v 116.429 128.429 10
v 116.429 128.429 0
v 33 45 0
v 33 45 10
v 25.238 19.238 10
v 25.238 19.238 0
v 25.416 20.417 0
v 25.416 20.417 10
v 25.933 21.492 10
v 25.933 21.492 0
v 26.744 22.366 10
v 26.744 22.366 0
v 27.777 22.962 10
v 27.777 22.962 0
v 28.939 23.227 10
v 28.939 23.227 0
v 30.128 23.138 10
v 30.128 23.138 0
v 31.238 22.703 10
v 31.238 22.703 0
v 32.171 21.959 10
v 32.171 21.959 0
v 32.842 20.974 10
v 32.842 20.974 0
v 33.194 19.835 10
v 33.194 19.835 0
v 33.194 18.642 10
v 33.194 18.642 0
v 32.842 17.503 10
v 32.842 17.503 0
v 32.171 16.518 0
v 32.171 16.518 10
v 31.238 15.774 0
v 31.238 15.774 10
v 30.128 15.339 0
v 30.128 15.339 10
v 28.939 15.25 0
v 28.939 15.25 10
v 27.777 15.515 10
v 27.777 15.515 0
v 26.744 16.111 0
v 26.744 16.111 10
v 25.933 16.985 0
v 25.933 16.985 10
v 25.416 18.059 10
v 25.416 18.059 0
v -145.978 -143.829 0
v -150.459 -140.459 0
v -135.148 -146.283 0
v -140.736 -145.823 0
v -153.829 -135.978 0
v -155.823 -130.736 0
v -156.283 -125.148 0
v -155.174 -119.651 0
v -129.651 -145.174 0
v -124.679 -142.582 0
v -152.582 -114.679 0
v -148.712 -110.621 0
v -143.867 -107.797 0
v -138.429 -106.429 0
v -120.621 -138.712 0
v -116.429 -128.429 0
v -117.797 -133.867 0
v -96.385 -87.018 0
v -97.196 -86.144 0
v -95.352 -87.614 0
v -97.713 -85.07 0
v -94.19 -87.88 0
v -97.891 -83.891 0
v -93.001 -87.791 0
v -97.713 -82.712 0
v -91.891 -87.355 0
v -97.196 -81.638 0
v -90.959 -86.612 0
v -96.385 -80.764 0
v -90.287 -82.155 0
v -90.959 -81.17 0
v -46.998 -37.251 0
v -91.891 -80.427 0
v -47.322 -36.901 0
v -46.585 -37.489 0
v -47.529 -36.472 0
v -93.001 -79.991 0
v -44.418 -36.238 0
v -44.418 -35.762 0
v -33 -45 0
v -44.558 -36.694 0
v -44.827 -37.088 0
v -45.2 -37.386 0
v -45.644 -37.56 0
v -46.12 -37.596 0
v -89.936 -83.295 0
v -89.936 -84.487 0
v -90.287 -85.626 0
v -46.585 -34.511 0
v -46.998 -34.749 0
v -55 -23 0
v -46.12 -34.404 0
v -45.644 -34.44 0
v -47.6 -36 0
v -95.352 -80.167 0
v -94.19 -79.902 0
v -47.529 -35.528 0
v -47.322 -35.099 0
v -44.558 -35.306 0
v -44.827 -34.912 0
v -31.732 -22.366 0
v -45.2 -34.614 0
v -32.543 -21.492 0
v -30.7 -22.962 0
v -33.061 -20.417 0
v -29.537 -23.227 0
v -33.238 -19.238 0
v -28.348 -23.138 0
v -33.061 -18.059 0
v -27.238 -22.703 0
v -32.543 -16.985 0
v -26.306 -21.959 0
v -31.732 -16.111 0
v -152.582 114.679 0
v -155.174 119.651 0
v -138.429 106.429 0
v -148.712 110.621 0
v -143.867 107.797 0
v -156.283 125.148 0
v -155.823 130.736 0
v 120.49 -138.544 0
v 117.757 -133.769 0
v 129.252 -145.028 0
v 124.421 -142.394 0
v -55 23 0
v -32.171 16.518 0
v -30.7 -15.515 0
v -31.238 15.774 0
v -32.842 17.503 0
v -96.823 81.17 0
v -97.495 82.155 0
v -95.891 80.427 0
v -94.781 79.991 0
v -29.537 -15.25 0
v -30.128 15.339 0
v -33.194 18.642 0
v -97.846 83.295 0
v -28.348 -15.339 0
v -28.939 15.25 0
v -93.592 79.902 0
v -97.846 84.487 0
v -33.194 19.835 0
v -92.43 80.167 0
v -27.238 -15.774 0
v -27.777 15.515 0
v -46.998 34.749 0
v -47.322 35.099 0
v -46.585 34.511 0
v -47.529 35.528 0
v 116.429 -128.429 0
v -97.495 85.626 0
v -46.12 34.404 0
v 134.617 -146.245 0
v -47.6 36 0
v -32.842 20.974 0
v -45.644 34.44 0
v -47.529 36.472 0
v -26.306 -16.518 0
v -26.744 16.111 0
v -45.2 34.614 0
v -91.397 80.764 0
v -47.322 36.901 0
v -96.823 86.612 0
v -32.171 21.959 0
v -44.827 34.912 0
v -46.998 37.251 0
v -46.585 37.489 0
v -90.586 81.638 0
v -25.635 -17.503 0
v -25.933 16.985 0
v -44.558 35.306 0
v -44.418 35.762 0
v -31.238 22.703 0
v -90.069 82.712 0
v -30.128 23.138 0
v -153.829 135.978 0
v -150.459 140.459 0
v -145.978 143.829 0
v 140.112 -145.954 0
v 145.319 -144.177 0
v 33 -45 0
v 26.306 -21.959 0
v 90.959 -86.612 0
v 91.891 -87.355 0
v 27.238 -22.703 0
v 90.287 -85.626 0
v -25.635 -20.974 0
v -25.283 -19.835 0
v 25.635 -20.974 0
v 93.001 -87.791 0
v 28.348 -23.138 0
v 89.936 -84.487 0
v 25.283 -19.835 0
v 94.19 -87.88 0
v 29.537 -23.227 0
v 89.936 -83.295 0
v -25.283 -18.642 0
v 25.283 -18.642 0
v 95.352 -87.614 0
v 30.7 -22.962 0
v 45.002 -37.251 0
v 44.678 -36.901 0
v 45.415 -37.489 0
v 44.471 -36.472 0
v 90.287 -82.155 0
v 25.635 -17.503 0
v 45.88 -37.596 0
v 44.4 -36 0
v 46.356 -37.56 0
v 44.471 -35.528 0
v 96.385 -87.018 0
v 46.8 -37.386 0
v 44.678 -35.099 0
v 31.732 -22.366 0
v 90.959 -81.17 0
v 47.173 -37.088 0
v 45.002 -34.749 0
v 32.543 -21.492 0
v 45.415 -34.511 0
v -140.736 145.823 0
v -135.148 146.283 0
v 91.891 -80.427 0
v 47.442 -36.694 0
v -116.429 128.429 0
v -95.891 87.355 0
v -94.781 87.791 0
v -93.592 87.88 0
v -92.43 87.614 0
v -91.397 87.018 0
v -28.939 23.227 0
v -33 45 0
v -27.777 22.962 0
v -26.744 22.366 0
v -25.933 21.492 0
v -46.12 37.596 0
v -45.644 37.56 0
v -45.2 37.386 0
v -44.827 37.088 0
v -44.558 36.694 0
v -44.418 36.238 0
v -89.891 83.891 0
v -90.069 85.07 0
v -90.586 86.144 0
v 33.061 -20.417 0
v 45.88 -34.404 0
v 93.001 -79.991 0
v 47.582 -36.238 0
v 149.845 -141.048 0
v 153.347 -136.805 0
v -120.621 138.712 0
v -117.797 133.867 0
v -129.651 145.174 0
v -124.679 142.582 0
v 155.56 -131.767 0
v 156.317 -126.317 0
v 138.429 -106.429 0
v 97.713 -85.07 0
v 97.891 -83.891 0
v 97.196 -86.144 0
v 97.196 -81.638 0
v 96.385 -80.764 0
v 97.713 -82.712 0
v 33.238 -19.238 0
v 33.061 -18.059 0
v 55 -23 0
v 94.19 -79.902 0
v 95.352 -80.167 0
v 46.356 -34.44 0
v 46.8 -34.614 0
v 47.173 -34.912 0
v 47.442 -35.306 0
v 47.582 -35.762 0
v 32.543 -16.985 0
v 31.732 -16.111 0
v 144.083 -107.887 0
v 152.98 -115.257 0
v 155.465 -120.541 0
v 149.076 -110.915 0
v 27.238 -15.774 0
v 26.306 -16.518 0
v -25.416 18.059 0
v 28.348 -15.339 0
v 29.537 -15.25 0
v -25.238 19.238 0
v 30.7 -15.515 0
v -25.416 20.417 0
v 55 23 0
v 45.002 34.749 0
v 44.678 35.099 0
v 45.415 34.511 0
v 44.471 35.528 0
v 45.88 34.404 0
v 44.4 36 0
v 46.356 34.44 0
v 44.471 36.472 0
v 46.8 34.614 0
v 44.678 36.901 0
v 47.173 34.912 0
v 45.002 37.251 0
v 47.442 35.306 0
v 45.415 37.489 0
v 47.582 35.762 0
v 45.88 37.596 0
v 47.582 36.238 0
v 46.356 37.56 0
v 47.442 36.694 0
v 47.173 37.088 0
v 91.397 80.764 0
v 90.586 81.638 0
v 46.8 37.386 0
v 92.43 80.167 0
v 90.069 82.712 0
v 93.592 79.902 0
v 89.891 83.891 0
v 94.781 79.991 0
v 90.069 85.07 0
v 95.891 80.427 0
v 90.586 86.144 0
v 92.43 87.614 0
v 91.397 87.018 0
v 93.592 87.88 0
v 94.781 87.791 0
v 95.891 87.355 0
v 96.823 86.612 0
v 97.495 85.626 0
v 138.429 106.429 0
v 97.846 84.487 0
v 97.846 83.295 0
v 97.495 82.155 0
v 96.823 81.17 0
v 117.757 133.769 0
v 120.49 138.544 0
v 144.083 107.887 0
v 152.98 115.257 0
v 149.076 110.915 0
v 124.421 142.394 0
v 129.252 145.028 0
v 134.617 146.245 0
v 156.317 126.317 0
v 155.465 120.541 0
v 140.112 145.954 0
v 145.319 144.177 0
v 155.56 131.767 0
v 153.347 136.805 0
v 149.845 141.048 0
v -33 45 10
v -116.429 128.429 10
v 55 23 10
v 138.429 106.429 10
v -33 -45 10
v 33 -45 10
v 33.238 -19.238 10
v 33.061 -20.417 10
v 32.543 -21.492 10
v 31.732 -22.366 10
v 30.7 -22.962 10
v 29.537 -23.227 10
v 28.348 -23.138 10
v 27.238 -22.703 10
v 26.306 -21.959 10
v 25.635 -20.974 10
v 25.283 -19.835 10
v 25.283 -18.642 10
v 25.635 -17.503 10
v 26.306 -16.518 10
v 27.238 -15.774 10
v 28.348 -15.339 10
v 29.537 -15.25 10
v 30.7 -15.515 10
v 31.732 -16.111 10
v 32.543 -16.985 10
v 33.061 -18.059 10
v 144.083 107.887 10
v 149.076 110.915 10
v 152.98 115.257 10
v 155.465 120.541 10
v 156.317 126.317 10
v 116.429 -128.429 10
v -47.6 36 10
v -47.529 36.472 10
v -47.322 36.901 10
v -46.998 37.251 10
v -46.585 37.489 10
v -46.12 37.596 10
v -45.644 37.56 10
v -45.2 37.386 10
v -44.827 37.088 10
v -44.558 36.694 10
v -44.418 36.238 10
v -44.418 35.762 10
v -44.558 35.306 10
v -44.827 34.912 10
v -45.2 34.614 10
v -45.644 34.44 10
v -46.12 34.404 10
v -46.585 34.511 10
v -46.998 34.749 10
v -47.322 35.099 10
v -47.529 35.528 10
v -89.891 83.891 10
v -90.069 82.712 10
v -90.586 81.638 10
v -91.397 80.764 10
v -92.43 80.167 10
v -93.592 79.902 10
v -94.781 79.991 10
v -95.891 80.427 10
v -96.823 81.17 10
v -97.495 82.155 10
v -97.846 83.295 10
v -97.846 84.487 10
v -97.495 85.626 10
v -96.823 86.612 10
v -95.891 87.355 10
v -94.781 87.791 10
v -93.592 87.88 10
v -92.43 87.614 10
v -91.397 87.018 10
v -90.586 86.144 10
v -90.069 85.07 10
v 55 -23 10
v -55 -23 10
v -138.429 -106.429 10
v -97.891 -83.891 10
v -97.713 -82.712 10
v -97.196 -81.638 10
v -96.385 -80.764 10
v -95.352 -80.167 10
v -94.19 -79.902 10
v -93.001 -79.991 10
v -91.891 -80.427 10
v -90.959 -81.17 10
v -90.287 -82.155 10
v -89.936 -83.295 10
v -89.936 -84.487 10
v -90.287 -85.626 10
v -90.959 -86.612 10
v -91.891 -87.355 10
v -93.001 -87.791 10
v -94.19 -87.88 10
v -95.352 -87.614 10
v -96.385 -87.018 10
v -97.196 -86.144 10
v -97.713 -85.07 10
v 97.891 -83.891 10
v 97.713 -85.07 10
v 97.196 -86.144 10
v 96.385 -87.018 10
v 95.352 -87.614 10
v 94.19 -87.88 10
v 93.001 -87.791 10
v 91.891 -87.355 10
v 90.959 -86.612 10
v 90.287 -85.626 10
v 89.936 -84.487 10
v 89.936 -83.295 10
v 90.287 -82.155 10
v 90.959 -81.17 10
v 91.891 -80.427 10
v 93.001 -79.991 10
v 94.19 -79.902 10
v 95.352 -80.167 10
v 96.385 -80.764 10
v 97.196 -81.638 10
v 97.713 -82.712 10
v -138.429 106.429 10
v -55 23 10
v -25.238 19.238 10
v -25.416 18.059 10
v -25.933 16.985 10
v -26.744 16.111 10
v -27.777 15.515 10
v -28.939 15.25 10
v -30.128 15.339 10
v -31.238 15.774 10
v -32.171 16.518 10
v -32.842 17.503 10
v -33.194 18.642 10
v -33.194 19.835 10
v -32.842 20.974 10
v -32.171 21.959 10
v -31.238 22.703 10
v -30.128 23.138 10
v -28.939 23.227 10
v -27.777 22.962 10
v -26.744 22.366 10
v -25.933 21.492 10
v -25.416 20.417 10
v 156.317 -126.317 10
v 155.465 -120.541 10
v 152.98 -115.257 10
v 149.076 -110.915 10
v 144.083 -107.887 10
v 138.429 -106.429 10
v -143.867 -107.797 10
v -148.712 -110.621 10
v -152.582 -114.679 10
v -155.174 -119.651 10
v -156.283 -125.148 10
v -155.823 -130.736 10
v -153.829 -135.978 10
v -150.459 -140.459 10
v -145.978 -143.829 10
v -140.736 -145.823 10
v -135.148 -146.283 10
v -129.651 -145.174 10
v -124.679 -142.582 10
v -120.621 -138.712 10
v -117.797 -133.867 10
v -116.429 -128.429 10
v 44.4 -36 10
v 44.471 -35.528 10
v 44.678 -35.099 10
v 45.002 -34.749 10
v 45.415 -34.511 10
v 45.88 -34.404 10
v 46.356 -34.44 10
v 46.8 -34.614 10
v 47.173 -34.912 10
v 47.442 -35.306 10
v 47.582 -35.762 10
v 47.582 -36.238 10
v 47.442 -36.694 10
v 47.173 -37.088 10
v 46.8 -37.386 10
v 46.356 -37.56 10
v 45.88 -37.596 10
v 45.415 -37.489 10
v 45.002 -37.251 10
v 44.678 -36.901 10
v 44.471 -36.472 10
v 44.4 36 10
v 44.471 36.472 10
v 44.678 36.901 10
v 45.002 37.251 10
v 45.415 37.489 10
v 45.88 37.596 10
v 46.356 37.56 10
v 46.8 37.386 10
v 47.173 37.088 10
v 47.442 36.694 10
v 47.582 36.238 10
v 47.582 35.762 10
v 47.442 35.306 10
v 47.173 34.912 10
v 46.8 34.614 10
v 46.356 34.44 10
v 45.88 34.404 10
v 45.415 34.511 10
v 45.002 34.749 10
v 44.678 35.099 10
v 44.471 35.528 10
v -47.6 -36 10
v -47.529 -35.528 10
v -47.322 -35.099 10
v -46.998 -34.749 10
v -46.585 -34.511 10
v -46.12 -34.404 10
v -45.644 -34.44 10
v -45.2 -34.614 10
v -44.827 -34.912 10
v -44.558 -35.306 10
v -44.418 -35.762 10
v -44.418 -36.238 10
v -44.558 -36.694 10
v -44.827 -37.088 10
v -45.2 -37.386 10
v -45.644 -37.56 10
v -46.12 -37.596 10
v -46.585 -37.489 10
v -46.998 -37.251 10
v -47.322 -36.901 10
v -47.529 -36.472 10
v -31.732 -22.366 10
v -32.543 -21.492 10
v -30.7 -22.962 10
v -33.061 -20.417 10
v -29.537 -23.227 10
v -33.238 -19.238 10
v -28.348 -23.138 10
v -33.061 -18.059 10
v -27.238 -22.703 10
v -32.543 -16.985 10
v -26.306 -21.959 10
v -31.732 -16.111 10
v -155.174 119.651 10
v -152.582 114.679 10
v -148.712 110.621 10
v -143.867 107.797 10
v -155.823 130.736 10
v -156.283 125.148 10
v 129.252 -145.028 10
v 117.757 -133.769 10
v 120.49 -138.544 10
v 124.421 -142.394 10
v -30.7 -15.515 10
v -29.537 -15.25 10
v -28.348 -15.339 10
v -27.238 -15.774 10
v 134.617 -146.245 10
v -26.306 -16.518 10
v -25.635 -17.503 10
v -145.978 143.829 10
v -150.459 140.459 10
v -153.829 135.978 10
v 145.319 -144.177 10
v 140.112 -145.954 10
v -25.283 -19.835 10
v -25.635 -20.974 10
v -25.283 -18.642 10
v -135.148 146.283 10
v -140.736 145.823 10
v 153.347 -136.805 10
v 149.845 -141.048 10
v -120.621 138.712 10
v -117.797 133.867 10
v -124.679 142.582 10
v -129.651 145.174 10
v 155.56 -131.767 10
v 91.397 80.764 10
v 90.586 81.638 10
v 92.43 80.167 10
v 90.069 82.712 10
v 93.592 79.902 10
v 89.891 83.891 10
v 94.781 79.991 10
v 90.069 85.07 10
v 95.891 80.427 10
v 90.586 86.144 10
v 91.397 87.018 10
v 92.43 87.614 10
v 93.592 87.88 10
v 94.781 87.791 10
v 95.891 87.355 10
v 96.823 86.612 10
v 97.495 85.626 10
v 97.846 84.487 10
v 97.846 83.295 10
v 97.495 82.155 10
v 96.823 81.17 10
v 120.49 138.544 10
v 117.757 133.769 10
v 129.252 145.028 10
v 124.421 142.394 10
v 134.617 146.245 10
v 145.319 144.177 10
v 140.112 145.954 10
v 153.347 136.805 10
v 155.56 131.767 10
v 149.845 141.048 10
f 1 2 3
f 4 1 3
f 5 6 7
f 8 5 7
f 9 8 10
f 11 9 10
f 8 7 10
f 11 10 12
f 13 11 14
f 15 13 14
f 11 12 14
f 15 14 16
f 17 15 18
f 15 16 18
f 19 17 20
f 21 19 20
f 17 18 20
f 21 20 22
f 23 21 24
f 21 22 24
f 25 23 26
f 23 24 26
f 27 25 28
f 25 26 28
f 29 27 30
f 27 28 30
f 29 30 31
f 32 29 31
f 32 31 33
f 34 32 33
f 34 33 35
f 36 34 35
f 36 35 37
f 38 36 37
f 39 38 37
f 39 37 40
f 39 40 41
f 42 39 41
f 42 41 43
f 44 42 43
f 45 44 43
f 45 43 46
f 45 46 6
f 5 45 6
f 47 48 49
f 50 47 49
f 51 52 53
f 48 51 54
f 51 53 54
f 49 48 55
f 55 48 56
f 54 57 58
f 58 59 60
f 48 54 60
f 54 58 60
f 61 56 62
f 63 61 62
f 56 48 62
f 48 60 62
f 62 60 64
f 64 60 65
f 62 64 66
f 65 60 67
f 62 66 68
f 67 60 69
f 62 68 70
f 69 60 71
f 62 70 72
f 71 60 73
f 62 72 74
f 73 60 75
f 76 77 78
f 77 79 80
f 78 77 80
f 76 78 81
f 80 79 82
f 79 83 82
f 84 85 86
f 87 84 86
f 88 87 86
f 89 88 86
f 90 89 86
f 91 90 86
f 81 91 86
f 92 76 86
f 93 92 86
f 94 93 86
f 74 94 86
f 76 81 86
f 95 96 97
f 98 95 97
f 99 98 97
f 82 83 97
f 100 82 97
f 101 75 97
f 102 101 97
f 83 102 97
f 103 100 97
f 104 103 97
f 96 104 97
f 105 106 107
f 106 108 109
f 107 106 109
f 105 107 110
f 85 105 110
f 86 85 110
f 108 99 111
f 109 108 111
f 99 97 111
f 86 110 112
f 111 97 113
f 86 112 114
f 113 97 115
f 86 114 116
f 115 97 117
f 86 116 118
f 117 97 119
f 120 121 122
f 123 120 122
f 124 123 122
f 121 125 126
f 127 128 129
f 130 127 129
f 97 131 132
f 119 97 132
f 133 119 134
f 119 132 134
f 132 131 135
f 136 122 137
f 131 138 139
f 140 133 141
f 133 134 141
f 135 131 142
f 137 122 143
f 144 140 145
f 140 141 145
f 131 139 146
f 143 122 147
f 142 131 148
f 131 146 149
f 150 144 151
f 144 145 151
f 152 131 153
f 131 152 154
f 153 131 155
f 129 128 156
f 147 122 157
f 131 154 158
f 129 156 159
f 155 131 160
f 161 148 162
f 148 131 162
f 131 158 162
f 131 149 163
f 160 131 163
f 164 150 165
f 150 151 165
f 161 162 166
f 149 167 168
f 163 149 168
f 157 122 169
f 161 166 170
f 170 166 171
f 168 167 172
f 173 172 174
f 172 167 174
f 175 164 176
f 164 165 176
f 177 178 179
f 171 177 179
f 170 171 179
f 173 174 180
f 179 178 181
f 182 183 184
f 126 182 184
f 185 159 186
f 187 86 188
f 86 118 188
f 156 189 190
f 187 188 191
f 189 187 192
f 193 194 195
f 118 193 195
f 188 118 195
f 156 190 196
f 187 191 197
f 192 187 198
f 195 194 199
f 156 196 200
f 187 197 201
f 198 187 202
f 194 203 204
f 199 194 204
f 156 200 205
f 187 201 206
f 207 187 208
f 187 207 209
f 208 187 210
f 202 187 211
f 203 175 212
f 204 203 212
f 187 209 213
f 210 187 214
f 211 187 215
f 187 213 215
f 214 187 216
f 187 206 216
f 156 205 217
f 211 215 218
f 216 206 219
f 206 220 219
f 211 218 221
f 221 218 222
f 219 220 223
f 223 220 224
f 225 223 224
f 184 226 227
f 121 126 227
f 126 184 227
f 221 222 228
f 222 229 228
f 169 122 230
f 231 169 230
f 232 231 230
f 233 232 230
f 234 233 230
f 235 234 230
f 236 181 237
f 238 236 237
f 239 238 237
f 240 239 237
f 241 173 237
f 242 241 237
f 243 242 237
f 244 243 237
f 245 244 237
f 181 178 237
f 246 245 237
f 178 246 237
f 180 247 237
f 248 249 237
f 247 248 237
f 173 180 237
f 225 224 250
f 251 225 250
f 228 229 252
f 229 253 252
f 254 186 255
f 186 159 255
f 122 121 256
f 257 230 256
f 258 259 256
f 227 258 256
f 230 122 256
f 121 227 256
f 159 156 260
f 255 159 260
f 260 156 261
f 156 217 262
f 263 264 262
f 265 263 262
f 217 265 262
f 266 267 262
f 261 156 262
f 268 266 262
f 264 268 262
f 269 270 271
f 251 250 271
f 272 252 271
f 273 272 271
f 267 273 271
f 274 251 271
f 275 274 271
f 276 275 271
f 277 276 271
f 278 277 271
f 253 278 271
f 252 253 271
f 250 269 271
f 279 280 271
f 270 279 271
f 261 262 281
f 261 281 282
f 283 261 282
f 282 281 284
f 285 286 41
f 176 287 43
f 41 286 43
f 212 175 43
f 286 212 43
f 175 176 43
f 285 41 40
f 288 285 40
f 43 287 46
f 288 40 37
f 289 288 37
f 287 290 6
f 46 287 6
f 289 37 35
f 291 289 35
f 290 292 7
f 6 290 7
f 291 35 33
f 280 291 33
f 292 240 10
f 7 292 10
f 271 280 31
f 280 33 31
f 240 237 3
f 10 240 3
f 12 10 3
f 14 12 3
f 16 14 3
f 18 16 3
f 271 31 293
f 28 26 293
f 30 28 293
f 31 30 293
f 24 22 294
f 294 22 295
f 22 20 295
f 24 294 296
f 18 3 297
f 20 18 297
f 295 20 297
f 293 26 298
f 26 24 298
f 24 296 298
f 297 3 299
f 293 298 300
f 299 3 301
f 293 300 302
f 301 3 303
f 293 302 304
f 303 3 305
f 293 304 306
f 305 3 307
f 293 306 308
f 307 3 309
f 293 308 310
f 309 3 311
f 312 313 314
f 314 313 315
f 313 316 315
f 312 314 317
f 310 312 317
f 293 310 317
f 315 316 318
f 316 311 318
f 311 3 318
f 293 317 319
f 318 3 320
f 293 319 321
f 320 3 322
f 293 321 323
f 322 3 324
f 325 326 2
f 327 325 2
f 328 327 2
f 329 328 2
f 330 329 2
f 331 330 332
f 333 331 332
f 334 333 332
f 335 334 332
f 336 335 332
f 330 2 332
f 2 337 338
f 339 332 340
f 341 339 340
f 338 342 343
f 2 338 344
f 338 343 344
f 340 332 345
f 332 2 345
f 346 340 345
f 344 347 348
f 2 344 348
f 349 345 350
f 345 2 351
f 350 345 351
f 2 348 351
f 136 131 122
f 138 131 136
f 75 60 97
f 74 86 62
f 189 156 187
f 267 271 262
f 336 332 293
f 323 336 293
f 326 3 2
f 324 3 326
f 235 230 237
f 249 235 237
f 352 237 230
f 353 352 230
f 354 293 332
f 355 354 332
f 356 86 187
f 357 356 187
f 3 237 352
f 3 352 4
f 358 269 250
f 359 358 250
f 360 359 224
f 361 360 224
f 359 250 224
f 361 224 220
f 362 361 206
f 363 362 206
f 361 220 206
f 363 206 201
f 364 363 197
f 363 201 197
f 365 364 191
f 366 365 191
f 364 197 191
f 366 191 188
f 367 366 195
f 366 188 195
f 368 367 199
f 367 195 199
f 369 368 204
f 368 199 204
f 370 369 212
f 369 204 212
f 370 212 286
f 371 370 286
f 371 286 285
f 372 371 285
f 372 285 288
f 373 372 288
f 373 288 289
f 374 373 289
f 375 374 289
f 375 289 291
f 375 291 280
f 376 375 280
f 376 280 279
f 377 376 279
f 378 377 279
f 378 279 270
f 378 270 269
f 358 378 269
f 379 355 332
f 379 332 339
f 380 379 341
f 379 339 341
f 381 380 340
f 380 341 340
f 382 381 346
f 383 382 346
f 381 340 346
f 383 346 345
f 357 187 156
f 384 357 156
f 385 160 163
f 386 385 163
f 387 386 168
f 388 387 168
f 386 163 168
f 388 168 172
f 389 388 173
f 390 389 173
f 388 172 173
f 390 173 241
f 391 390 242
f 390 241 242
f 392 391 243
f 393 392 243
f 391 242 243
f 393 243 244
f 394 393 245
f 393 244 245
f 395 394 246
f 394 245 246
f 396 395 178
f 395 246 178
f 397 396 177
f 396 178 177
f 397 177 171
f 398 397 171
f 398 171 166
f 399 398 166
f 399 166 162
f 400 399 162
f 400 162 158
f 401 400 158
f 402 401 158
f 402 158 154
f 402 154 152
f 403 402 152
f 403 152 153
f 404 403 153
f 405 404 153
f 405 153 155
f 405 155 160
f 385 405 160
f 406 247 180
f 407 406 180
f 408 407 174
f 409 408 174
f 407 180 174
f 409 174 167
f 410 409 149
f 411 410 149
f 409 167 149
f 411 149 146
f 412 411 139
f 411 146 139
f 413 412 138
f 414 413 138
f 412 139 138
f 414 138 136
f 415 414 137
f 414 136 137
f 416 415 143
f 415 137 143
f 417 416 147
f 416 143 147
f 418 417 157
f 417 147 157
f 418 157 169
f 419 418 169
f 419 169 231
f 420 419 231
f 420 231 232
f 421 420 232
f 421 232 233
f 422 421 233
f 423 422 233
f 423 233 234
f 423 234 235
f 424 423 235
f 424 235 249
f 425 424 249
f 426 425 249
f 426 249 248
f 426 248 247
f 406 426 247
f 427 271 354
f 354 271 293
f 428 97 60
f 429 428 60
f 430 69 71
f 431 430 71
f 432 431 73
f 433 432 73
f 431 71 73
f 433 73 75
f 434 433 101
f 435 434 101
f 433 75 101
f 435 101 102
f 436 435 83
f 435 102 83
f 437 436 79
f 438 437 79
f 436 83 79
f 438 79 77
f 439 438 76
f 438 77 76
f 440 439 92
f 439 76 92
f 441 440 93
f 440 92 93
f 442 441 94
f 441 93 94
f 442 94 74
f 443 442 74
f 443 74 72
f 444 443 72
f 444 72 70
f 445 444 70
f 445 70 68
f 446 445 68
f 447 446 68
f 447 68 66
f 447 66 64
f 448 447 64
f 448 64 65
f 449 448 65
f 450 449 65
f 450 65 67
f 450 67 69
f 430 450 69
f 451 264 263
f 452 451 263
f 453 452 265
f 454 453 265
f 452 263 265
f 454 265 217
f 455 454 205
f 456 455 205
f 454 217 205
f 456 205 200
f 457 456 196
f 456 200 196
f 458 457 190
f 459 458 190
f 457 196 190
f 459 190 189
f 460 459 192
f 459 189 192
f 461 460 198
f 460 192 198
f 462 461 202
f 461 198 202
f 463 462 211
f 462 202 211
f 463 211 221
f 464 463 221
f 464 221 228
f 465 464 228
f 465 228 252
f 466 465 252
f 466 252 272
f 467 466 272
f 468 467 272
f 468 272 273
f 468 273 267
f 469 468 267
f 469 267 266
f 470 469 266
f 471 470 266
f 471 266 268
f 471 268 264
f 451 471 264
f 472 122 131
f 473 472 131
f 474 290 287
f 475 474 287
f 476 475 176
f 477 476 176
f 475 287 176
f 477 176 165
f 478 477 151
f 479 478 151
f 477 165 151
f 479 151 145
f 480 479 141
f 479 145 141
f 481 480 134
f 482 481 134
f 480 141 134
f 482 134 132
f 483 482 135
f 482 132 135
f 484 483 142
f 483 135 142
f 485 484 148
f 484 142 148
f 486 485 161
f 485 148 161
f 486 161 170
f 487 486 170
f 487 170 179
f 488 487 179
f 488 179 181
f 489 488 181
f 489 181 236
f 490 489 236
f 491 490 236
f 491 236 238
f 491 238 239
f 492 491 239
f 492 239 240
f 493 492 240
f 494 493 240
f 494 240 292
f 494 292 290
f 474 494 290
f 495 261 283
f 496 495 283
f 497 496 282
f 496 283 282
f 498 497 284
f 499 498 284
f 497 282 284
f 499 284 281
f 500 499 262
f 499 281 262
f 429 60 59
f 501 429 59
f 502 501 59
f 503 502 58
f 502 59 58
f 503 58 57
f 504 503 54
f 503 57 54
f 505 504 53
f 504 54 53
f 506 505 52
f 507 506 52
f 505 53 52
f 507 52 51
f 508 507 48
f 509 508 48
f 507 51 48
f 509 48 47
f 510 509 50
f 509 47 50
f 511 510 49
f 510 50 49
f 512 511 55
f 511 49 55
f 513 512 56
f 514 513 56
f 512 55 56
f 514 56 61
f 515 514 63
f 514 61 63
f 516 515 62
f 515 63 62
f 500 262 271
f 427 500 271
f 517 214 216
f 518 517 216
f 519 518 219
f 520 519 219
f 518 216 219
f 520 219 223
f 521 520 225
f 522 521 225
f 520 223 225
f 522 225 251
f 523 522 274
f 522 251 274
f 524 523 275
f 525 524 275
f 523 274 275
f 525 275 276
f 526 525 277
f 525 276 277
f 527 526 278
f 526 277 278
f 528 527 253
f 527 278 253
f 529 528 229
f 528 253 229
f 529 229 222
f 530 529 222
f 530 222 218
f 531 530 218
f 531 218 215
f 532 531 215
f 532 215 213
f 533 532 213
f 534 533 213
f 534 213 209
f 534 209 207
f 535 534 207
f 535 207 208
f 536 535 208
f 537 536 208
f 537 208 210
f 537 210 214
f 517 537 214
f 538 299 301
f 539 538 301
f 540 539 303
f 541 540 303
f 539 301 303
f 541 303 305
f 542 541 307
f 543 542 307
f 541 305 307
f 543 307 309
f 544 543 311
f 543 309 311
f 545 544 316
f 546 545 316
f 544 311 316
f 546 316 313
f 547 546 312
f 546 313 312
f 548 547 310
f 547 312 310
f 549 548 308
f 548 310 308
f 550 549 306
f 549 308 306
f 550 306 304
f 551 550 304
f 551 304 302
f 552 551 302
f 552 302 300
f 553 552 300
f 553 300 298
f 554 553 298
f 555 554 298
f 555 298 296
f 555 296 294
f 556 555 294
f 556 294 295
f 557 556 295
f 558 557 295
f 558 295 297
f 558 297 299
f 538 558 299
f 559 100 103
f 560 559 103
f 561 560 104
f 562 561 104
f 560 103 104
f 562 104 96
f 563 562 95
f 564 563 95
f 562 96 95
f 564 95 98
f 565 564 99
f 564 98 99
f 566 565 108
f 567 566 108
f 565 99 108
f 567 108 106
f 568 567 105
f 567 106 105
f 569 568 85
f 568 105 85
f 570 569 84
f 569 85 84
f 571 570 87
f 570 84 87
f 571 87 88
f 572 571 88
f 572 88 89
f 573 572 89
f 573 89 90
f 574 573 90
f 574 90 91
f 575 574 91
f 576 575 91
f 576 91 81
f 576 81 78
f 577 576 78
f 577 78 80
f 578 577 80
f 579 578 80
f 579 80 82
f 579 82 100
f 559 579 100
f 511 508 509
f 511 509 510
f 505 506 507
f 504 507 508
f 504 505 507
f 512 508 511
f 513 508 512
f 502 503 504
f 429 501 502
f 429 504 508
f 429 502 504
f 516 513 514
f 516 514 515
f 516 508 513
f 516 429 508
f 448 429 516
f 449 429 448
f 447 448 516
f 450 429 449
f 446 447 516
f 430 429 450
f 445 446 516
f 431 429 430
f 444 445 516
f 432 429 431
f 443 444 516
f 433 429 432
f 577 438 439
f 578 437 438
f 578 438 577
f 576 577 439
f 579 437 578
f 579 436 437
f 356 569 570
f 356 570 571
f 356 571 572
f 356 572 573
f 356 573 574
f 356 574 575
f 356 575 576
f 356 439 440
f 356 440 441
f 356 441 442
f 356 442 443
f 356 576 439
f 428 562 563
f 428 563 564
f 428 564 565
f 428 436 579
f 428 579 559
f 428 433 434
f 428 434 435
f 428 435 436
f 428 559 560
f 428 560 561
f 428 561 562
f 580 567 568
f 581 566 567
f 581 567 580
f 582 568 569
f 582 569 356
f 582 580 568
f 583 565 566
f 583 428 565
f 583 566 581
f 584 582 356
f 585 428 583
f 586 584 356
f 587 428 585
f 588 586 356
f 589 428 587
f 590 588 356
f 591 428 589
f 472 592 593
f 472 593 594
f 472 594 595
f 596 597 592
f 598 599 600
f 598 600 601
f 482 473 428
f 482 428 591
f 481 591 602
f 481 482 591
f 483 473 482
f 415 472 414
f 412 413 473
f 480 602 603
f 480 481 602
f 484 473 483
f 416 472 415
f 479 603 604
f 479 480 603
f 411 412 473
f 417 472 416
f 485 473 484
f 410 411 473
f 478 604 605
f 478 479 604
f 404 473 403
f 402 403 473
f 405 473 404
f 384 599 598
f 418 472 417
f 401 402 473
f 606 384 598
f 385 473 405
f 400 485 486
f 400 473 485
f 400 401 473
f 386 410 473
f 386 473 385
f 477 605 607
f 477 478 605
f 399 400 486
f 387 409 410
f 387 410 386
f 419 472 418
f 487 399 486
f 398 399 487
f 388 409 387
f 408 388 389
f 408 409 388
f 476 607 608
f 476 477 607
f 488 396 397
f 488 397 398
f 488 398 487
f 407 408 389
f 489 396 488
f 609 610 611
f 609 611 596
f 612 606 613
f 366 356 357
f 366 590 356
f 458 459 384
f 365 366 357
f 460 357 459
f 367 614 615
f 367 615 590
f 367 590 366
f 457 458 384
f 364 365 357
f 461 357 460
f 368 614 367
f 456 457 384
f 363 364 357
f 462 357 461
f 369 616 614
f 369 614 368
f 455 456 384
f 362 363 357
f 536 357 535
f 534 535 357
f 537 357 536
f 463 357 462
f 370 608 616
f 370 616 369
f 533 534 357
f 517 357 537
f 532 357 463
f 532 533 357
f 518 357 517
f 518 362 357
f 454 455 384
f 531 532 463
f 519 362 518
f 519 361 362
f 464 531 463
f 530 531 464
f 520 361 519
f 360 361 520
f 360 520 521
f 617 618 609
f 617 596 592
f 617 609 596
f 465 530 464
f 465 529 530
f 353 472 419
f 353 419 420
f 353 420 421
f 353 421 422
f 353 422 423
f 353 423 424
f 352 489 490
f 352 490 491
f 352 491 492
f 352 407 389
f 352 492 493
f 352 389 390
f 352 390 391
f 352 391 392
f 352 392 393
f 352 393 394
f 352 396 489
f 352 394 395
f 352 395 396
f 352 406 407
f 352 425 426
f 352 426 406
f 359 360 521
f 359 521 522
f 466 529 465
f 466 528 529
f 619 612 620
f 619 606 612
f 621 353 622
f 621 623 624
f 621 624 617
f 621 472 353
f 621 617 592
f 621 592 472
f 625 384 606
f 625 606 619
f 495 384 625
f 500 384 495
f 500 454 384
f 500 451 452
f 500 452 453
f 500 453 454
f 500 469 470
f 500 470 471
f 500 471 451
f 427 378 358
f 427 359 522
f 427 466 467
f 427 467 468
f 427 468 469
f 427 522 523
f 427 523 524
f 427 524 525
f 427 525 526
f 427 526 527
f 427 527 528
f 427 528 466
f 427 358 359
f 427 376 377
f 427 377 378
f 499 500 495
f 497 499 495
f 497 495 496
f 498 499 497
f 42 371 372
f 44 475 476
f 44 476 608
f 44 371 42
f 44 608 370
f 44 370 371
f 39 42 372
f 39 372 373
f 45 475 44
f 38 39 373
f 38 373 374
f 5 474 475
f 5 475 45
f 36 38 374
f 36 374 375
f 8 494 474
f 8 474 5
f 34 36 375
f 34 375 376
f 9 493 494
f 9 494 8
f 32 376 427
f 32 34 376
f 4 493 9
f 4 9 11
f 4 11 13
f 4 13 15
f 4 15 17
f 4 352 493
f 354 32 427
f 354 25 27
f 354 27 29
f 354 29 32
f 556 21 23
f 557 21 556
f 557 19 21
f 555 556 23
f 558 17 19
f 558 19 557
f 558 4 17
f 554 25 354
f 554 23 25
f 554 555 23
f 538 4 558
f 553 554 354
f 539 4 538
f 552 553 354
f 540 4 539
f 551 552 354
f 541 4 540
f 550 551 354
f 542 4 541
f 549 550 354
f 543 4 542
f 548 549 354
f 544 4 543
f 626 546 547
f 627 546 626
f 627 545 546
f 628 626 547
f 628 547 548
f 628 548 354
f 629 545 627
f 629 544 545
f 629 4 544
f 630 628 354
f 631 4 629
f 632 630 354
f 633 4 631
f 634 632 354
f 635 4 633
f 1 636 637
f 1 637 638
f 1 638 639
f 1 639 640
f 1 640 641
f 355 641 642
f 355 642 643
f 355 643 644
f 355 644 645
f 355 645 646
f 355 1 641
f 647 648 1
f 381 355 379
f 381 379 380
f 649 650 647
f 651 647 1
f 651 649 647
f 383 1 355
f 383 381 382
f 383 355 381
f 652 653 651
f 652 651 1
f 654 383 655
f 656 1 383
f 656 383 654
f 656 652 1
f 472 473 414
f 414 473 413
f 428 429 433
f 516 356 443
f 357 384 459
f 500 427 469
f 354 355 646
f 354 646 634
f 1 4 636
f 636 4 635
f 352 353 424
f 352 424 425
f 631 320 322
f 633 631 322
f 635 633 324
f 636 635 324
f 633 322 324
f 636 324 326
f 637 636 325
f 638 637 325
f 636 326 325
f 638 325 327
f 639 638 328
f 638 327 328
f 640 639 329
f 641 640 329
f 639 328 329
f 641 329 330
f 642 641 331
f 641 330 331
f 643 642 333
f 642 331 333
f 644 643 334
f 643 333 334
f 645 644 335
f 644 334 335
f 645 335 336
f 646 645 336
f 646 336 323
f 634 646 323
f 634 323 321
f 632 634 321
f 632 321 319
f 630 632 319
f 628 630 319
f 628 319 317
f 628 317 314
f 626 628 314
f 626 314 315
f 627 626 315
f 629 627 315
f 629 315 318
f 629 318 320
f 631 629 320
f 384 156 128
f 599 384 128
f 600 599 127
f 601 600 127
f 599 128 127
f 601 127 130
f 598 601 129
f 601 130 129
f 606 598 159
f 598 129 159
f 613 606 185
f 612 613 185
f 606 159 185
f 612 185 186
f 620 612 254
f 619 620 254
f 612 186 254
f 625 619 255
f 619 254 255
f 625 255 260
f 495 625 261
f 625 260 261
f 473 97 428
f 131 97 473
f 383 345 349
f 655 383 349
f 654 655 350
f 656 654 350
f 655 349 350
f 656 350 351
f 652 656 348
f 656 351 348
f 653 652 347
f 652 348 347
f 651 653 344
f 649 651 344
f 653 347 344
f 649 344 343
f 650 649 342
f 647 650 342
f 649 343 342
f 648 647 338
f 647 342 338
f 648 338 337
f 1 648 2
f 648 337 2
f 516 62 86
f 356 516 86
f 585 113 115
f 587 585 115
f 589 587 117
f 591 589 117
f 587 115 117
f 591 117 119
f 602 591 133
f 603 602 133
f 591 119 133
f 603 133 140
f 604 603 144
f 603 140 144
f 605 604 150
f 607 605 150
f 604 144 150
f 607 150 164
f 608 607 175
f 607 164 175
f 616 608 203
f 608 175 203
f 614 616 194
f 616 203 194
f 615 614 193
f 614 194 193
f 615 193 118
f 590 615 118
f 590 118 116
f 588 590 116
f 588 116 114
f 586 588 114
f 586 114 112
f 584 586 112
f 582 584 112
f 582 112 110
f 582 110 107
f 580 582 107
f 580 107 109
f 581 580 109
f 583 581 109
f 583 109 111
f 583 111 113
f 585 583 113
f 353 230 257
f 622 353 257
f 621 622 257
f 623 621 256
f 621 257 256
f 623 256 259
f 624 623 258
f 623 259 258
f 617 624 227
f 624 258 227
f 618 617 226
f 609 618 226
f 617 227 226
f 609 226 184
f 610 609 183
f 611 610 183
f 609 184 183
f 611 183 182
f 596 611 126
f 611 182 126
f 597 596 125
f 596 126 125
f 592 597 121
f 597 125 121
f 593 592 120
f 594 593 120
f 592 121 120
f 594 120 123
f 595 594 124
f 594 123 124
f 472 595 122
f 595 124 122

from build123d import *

# Parameters (mm, degrees)
ESQUISSE1_W             = 110
ESQUISSE1_H             = 90
BOSS_EXTRU_1_DEPTH      = 10
ESQUISSE3_R             = 4
ESQUISSE3_R_2           = 1.6
ENL_V_MAT_EXTRU_2_DEPTH = 215.345138396


with BuildPart() as part:
    # Esquisse1 → Boss.-Extru.1 (new body)
    with BuildSketch(Plane.XY):
        with BuildLine():
            ThreePointArc((-116.429085419, 128.429085419), (-150.45941546, 140.45941546), (-138.429085419, 106.429085419))
            Line((-138.429085419, 106.429085419), (-147.317279836, 115.317279836))
            Line((-147.317279836, 115.317279836), (-125.317279836, 137.317279836))
            Line((-125.317279836, 137.317279836), (-116.429085419, 128.429085419))
        make_face()
        with BuildLine():
            Line((-147.317279836, 115.317279836), (-138.429085419, 106.429085419))
            ThreePointArc((-138.429085419, 106.429085419), (-122.942604357, 111.447240972), (-116.317279836, 126.317279836))
            ThreePointArc((-116.317279836, 126.317279836), (-116.345250791, 127.374661426), (-116.429085419, 128.429085419))
            Line((-116.429085419, 128.429085419), (-125.317279836, 137.317279836))
            Line((-125.317279836, 137.317279836), (-147.317279836, 115.317279836))
        make_face()
        with BuildLine():
            Line((-138.429085419, 106.429085419), (-55, 23))
            Line((-55, 23), (-55, 45))
            Line((-55, 45), (-33, 45))
            Line((-33, 45), (-116.429085419, 128.429085419))
            ThreePointArc((-116.429085419, 128.429085419), (-116.345250791, 127.374661426), (-116.317279836, 126.317279836))
            ThreePointArc((-116.317279836, 126.317279836), (-122.942604357, 111.447240972), (-138.429085419, 106.429085419))
        make_face()
        with BuildLine():
            Line((116.429085419, 128.429085419), (33, 45))
            Line((33, 45), (55, 45))
            Line((55, 45), (55, 23))
            Line((55, 23), (138.429085419, 106.429085419))
            ThreePointArc((138.429085419, 106.429085419), (122.175144213, 112.175144213), (116.429085419, 128.429085419))
        make_face()
        with BuildLine():
            ThreePointArc((156.317279836, 126.317279836), (137.374661426, 146.289308881), (116.429085419, 128.429085419))
            Line((116.429085419, 128.429085419), (125.317279836, 137.317279836))
            Line((125.317279836, 137.317279836), (147.317279836, 115.317279836))
            Line((147.317279836, 115.317279836), (138.429085419, 106.429085419))
            ThreePointArc((138.429085419, 106.429085419), (151.187318701, 112.942604357), (156.317279836, 126.317279836))
        make_face()
        with BuildLine():
            Line((125.317279836, 137.317279836), (116.429085419, 128.429085419))
            ThreePointArc((116.429085419, 128.429085419), (122.175144213, 112.175144213), (138.429085419, 106.429085419))
            Line((138.429085419, 106.429085419), (147.317279836, 115.317279836))
            Line((147.317279836, 115.317279836), (125.317279836, 137.317279836))
        make_face()
        Rectangle(ESQUISSE1_W, ESQUISSE1_H)
        with BuildLine():
            ThreePointArc((138.429085419, -106.429085419), (122.175144213, -112.175144213), (116.429085419, -128.429085419))
            Line((116.429085419, -128.429085419), (125.317279836, -137.317279836))
            Line((125.317279836, -137.317279836), (147.317279836, -115.317279836))
            Line((147.317279836, -115.317279836), (138.429085419, -106.429085419))
        make_face()
        with BuildLine():
            Line((125.317279836, -137.317279836), (116.429085419, -128.429085419))
            ThreePointArc((116.429085419, -128.429085419), (137.374661426, -146.289308881), (156.317279836, -126.317279836))
            ThreePointArc((156.317279836, -126.317279836), (151.187318701, -112.942604357), (138.429085419, -106.429085419))
            Line((138.429085419, -106.429085419), (147.317279836, -115.317279836))
            Line((147.317279836, -115.317279836), (125.317279836, -137.317279836))
        make_face()
        with BuildLine():
            Line((55, -45), (33, -45))
            Line((33, -45), (116.429085419, -128.429085419))
            ThreePointArc((116.429085419, -128.429085419), (122.175144213, -112.175144213), (138.429085419, -106.429085419))
            Line((138.429085419, -106.429085419), (55, -23))
            Line((55, -23), (55, -45))
        make_face()
        with BuildLine():
            ThreePointArc((-116.317279836, -126.317279836), (-122.942604357, -111.447240972), (-138.429085419, -106.429085419))
            Line((-138.429085419, -106.429085419), (-147.317279836, -115.317279836))
            Line((-147.317279836, -115.317279836), (-125.317279836, -137.317279836))
            Line((-125.317279836, -137.317279836), (-116.429085419, -128.429085419))
            ThreePointArc((-116.429085419, -128.429085419), (-116.345250791, -127.374661426), (-116.317279836, -126.317279836))
        make_face()
        with BuildLine():
            Line((-147.317279836, -115.317279836), (-138.429085419, -106.429085419))
            ThreePointArc((-138.429085419, -106.429085419), (-150.45941546, -140.45941546), (-116.429085419, -128.429085419))
            Line((-116.429085419, -128.429085419), (-125.317279836, -137.317279836))
            Line((-125.317279836, -137.317279836), (-147.317279836, -115.317279836))
        make_face()
        with BuildLine():
            Line((-55, -45), (-55, -23))
            Line((-55, -23), (-138.429085419, -106.429085419))
            ThreePointArc((-138.429085419, -106.429085419), (-122.942604357, -111.447240972), (-116.317279836, -126.317279836))
            ThreePointArc((-116.317279836, -126.317279836), (-116.345250791, -127.374661426), (-116.429085419, -128.429085419))
            Line((-116.429085419, -128.429085419), (-33, -45))
            Line((-33, -45), (-55, -45))
        make_face()
    extrude(amount=BOSS_EXTRU_1_DEPTH)

    # Esquisse3 → Enlèv. mat.-Extru.2 (cut, through all)
    with BuildSketch(Plane(origin=(0, 0, 0), x_dir=(-1, 0, 0), z_dir=(0, 0, -1))):
        with Locations(Location((93.890872965, 83.890872965, 0), (0, 0, 180))):
            Circle(ESQUISSE3_R)
        with Locations((-93.890872965, 83.890872965)):
            Circle(ESQUISSE3_R)
        with Locations((-29.238399287, 19.238399287)):
            Circle(ESQUISSE3_R)
        with Locations((-46, 36)):
            Circle(ESQUISSE3_R_2)
        with Locations((46, 36)):
            Circle(ESQUISSE3_R_2)
        with Locations((46, -36)):
            Circle(ESQUISSE3_R_2)
        with Locations((-46, -36)):
            Circle(ESQUISSE3_R_2)
        with Locations(Location((29.238399287, 19.238399287, 0), (0, 0, 180))):
            Circle(ESQUISSE3_R)
        with Locations(Location((-93.890872965, -83.890872965, 0), (0, 0, 180))):
            Circle(ESQUISSE3_R)
        with Locations(Location((-29.238399287, -19.238399287, 0), (0, 0, 180))):
            Circle(ESQUISSE3_R)
        with Locations((29.238399287, -19.238399287)):
            Circle(ESQUISSE3_R)
        with Locations((93.890872965, -83.890872965)):
            Circle(ESQUISSE3_R)
    extrude(amount=-ENL_V_MAT_EXTRU_2_DEPTH, mode=Mode.SUBTRACT)


solid = part.part
